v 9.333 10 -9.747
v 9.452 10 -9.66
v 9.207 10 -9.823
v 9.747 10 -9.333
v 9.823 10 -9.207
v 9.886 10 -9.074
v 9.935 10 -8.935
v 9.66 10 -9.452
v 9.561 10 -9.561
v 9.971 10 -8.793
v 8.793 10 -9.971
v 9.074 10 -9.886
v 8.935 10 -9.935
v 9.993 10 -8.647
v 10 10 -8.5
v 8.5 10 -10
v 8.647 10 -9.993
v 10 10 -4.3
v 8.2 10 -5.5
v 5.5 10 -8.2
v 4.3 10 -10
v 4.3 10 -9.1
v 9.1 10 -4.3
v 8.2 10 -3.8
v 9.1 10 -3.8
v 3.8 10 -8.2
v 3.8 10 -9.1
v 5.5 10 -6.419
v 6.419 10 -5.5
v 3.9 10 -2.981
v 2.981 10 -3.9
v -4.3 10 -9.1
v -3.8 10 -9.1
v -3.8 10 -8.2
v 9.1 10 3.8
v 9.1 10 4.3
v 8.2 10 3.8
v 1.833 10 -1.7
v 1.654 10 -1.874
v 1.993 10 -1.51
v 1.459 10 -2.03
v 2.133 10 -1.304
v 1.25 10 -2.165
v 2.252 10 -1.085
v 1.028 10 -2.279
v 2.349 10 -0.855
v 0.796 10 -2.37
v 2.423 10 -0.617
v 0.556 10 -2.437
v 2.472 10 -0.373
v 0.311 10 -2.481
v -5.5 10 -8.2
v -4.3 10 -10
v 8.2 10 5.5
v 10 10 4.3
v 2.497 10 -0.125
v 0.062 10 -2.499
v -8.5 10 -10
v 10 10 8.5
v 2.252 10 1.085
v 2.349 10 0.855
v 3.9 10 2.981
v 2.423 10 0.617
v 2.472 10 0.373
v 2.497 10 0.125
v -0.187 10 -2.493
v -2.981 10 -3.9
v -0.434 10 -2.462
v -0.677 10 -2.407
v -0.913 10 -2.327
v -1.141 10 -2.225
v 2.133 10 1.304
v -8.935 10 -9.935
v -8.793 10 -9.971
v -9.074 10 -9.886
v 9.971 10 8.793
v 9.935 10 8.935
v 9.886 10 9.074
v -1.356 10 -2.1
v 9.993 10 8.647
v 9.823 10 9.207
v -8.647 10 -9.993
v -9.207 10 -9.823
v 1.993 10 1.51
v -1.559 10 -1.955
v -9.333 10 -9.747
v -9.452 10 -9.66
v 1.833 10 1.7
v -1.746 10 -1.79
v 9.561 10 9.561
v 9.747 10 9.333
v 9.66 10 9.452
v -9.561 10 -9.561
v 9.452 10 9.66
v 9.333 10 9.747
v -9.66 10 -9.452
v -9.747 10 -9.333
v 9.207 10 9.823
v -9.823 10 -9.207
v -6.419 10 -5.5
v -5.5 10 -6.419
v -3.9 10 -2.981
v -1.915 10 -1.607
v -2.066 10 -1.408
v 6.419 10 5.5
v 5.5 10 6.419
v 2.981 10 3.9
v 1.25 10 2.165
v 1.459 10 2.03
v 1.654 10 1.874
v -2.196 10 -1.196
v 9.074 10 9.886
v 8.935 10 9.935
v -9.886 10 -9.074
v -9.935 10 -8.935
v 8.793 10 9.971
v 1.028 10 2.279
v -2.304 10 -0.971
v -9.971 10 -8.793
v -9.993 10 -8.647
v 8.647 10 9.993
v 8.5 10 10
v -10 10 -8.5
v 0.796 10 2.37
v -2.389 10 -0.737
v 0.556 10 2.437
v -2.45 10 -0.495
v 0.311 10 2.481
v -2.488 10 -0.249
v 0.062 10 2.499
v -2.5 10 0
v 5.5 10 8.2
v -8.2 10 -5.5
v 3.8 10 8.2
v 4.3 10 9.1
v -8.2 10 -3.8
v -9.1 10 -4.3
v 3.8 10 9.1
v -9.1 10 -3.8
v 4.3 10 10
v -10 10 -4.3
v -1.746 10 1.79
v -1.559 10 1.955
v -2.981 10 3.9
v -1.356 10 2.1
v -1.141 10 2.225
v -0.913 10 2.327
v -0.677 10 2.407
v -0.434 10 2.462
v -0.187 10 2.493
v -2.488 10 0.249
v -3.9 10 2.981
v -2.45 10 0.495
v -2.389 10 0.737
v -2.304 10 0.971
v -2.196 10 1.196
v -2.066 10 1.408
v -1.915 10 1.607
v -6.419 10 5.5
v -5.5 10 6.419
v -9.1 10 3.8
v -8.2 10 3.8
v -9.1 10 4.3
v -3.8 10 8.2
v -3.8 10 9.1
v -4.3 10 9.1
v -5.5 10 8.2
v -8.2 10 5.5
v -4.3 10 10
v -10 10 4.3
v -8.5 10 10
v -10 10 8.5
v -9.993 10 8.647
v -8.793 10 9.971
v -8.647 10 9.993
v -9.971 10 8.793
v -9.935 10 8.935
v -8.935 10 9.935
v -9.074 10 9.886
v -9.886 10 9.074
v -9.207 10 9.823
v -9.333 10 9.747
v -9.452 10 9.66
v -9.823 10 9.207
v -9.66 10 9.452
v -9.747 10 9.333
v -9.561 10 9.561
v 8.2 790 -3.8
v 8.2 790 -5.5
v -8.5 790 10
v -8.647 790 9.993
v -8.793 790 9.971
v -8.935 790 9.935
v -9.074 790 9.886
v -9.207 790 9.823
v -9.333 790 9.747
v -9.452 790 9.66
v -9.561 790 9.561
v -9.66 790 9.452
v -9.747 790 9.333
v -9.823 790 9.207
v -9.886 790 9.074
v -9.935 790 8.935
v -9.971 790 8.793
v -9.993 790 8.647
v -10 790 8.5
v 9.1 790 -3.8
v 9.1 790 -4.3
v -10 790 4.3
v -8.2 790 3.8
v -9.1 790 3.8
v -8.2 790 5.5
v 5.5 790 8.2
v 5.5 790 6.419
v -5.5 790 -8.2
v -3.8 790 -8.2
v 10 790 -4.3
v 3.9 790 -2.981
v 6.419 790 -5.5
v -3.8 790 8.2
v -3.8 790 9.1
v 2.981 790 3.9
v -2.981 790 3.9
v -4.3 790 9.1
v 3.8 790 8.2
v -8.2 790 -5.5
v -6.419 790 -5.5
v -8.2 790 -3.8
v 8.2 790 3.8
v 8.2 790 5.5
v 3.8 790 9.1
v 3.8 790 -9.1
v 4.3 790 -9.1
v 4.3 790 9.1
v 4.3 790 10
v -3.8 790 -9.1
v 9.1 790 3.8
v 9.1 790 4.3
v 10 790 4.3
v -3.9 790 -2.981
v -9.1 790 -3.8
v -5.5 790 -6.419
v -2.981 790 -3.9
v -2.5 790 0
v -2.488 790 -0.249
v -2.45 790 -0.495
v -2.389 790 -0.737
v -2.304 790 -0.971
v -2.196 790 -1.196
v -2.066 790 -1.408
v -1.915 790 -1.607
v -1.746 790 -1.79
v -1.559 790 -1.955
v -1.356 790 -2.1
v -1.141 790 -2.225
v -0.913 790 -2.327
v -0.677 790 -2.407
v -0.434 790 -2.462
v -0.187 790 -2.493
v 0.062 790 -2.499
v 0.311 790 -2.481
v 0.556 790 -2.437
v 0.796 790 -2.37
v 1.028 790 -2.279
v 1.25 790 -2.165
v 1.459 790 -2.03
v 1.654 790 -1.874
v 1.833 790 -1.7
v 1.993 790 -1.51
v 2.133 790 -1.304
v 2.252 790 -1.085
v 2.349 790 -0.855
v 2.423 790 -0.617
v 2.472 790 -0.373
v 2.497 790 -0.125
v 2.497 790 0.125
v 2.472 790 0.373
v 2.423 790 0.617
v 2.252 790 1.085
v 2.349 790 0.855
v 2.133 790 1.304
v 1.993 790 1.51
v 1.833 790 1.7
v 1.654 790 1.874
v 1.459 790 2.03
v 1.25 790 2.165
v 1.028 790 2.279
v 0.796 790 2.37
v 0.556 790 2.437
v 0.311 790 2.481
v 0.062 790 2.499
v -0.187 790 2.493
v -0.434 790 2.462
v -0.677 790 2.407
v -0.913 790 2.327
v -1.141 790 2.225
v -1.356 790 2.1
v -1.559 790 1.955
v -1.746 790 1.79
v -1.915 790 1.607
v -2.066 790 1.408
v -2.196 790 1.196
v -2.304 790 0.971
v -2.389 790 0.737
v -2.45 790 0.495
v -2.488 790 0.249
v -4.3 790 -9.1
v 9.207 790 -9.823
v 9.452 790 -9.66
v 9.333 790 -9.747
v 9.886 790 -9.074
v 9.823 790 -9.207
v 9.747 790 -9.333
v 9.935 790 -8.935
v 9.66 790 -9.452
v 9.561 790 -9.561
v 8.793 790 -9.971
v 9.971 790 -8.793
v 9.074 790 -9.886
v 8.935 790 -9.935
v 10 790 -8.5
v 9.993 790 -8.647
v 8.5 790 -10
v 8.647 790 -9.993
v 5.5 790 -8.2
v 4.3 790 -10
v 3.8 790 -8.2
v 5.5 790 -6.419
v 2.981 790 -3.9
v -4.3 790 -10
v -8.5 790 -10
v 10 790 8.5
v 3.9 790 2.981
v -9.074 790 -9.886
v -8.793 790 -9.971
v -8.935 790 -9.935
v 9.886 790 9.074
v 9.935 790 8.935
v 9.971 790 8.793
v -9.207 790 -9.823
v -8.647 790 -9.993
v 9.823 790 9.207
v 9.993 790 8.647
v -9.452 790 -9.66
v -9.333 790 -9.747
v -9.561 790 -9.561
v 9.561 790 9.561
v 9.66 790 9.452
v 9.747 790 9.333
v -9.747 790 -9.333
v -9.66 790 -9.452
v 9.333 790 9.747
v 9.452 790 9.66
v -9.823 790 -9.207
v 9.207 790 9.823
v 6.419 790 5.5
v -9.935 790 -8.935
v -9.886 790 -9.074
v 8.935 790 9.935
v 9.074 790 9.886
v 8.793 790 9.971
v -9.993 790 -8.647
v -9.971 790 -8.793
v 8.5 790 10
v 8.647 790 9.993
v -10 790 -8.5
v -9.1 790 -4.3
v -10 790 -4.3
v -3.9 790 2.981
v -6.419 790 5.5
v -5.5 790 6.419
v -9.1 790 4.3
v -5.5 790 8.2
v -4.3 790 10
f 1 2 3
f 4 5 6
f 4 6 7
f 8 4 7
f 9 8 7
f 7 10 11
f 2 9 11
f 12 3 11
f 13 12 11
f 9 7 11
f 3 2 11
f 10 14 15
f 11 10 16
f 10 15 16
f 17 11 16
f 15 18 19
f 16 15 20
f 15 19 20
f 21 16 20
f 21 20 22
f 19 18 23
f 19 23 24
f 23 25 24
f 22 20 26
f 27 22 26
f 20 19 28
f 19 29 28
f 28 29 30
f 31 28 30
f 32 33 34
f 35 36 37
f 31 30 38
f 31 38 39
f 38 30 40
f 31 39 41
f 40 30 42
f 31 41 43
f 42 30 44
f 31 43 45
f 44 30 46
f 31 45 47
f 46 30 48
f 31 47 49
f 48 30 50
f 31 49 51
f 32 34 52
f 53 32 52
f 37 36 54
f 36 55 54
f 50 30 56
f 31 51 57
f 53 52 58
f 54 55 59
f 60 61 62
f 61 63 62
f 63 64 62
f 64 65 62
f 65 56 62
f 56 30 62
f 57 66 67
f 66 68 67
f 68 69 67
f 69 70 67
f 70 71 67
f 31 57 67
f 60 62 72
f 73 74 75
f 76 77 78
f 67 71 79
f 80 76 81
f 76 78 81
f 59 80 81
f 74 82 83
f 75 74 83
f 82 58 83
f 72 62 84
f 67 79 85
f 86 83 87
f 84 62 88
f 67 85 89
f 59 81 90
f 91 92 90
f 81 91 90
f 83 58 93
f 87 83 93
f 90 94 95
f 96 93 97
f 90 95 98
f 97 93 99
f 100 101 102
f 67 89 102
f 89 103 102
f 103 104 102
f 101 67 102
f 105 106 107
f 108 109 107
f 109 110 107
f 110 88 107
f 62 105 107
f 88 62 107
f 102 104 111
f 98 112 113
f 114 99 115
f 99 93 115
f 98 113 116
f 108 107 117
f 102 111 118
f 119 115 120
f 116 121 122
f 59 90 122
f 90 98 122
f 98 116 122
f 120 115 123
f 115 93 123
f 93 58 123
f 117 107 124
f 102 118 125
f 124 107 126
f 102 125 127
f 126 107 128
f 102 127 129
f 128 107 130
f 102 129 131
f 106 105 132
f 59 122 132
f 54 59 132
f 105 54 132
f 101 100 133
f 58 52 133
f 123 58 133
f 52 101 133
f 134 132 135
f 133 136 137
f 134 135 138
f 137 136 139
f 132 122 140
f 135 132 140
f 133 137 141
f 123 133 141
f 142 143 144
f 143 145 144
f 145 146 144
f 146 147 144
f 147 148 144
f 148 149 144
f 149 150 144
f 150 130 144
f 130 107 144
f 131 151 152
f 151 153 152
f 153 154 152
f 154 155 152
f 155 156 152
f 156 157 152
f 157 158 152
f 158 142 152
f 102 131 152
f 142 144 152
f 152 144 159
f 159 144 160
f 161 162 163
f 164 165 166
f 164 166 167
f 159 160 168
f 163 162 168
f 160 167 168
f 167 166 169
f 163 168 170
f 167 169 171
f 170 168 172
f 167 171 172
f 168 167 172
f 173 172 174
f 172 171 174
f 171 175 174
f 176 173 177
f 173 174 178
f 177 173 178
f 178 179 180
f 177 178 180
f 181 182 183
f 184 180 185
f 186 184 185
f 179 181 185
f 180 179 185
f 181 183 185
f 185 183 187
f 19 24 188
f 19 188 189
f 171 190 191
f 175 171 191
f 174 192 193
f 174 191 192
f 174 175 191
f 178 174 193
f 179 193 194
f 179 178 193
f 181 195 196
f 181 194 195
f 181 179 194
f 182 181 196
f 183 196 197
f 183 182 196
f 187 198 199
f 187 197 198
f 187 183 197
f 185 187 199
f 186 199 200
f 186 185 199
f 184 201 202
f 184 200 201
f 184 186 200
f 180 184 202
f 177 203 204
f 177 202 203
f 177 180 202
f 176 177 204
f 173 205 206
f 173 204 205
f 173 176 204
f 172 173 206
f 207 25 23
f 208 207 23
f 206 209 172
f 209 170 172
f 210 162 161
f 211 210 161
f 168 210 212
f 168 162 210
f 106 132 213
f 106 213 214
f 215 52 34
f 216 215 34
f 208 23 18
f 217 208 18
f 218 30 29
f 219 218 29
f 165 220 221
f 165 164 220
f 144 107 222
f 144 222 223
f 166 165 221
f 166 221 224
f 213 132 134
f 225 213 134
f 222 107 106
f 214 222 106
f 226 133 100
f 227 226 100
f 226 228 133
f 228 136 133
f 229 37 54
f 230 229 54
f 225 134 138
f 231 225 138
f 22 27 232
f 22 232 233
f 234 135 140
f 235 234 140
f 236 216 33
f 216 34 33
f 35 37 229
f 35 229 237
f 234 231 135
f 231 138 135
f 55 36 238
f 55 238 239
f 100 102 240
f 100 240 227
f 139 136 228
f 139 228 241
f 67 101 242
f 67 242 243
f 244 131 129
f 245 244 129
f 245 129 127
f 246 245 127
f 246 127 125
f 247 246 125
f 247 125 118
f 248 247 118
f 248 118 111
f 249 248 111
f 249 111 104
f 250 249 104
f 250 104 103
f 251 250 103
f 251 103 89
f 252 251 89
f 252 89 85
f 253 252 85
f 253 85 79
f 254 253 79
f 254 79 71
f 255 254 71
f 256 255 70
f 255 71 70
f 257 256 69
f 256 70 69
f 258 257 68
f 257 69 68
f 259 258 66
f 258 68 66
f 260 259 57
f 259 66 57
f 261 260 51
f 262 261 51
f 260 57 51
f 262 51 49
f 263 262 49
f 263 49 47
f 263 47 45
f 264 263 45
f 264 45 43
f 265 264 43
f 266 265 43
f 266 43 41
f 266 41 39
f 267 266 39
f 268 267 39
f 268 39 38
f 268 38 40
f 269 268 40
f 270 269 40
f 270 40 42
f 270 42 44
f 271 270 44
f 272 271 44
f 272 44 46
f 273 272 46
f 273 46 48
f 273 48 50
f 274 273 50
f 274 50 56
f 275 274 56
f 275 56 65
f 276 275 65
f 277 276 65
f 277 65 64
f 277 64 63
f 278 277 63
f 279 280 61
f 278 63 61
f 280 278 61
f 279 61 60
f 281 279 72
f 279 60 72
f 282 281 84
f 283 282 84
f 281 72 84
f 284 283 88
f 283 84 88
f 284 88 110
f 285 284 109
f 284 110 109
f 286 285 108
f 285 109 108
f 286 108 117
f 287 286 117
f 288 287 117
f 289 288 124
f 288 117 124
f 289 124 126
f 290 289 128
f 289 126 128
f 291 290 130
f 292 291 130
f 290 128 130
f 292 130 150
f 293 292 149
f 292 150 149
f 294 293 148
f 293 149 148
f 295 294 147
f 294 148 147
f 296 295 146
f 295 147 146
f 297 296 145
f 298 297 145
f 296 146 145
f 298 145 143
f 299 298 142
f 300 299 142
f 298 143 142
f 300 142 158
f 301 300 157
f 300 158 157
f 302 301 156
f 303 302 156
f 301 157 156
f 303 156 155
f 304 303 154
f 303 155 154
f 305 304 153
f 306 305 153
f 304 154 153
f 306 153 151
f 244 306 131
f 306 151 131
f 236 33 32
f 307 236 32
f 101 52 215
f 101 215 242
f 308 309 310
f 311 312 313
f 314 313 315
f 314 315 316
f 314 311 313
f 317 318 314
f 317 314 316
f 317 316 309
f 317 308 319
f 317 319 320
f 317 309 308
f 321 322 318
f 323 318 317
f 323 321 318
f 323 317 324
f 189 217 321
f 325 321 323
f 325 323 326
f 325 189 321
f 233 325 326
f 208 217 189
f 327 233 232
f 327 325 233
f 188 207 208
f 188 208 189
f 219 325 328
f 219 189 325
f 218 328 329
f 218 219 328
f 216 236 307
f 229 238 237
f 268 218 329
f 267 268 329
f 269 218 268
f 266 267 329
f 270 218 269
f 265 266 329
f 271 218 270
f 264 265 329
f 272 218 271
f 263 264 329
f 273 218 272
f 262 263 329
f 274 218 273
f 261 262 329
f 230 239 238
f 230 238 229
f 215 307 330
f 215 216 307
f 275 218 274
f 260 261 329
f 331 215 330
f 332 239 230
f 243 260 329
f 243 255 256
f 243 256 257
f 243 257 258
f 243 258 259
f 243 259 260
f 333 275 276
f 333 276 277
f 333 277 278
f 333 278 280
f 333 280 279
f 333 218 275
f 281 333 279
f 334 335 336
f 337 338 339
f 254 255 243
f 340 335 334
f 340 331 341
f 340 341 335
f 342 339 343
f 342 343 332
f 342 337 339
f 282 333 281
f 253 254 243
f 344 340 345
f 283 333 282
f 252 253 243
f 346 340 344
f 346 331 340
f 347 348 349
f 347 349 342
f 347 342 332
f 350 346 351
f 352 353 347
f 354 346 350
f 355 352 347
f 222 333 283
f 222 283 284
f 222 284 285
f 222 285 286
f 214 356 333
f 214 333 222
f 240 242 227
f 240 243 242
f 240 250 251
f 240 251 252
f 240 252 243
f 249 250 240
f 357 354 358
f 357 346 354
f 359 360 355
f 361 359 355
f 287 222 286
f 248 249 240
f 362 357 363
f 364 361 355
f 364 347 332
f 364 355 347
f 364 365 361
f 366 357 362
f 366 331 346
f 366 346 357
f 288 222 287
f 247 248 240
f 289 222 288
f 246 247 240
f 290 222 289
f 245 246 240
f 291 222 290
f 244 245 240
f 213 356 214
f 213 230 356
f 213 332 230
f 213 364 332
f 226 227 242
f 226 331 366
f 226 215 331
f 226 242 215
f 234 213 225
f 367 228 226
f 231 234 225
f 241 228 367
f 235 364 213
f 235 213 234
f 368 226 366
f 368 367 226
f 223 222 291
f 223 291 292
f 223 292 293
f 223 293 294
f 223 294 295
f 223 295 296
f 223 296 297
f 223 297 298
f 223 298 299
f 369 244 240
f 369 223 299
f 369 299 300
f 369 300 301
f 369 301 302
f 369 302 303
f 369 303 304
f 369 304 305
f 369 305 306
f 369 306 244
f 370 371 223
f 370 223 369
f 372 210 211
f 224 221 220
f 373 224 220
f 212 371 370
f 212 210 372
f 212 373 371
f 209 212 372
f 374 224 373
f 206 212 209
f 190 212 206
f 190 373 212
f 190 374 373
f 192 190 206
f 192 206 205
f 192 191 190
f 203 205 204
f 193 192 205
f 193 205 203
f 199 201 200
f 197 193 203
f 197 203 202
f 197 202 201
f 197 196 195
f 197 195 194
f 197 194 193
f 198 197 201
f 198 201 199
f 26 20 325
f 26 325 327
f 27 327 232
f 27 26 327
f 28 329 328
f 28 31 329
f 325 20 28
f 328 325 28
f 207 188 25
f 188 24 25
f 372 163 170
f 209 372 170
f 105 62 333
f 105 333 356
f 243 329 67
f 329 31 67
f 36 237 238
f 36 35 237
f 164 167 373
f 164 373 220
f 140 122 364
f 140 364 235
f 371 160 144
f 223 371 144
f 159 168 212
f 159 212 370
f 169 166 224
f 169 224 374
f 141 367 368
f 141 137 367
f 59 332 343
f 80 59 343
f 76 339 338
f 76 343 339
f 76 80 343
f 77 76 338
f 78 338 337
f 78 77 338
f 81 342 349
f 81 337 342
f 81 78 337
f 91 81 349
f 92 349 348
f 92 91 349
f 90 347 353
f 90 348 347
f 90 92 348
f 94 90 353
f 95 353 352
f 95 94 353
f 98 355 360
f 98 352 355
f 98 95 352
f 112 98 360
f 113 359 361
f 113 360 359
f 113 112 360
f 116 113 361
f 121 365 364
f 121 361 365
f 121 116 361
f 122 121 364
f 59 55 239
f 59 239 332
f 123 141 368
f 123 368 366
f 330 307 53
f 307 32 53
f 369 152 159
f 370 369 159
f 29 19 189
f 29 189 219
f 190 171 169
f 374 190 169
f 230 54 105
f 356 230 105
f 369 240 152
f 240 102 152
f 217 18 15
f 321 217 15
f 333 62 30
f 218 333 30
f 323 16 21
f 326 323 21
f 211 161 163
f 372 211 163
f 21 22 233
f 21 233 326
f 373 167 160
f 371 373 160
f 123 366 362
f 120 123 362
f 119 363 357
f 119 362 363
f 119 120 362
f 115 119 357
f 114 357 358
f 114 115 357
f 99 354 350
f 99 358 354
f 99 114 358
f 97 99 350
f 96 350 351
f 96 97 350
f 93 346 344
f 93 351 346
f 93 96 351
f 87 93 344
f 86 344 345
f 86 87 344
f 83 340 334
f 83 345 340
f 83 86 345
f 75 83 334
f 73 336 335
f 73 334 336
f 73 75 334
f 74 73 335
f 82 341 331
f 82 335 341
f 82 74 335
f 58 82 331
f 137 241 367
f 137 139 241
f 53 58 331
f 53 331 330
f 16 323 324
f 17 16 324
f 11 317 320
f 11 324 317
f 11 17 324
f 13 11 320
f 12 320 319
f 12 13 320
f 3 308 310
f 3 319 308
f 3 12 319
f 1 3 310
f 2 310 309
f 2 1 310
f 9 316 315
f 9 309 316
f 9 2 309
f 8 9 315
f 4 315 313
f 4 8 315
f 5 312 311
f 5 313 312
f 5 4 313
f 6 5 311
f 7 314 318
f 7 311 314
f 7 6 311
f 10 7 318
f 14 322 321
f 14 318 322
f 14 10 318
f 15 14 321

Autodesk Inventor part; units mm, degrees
ref_plane "起始平面" through (0, 10, 0) normal (0, 1, 0) x (-1, 0, 0)
ref_plane "终止平面" through (0, 790, 0) normal (0, 1, 0) x (-1, 0, 0)
sketch "草图" plane through (0, 0, 0) normal (0, 1, 0) x (-1, 0, 0)
  line L0 (-9.1, 10.0192) -> (-9.101, 10.0203)
  line L1 (-10, 10) -> (-9.5607, 9.5607) construction
  arc A0 (-8.5, 10) -> (-10, 8.5) centre (-8.5, 8.5) ccw
  circle A1 centre (0, 0) radius 2.5
  line L2 (-2.9808, 3.9) -> (0, 3.9)
  line L3 (-3.9, 0) -> (-3.9, 2.9808)
  line L4 (-2.5, 0) -> (-3.1, 0)
  line L5 (2.9808, 3.9) -> (0, 3.9)
  circle A2 centre (0, 0) radius 2.5
  circle A3 centre (0, 0) radius 2.5
  circle A4 centre (0, 0) radius 2.5
  line L6 (0, 16.3557) -> (0, -12.0006)
  line L7 (-4.3, 9.1) -> (-4.3, 10)
  line L8 (2.9808, -3.9) -> (0, -3.9)
  line L9 (-3.9, 0) -> (-3.9, -2.9808)
  line L10 (3.9, 0) -> (3.9, -2.9808)
  line L11 (-2.9808, -3.9) -> (-5.5, -6.4192)
  line L12 (-2.9808, -3.9) -> (0, -3.9)
  line L13 (3.8, -8.2) -> (3.8, -9.1)
  line L14 (5.5, -6.4192) -> (2.9808, -3.9)
  line L15 (3.8, -9.1) -> (4.3, -9.1)
  line L16 (5.5, -8.2) -> (3.8, -8.2)
  line L17 (5.5, -8.2) -> (5.5, -6.4192)
  line L18 (3.9, -2.9808) -> (6.4192, -5.5)
  line L19 (8.2, -3.8) -> (8.2, -5.5)
  line L20 (8.2, -5.5) -> (6.4192, -5.5)
  line L21 (8.2, -3.8) -> (9.1, -3.8)
  line L22 (9.1, -3.8) -> (9.1, -4.3)
  line L23 (9.1, -4.3) -> (10, -4.3)
  line L24 (10, -4.3) -> (10, -8.5)
  arc A5 (8.5, -10) -> (10, -8.5) centre (8.5, -8.5) ccw
  line L25 (8.5, -10) -> (4.3, -10)
  line L26 (4.3, -9.1) -> (4.3, -10)
  line L27 (5.5, 6.4192) -> (2.9808, 3.9)
  line L28 (3.9, 2.9808) -> (6.4192, 5.5)
  line L29 (10, 4.3) -> (10, 8.5)
  line L30 (3.9, 0) -> (3.9, 2.9808)
  line L31 (5.5, 8.2) -> (5.5, 6.4192)
  line L32 (5.5, 8.2) -> (3.8, 8.2)
  line L33 (4.3, 9.1) -> (4.3, 10)
  arc A6 (10, 8.5) -> (8.5, 10) centre (8.5, 8.5) ccw
  line L34 (8.5, 10) -> (4.3, 10)
  line L35 (8.2, 3.8) -> (9.1, 3.8)
  line L36 (9.1, 4.3) -> (10, 4.3)
  line L37 (9.1, 3.8) -> (9.1, 4.3)
  line L38 (8.2, 3.8) -> (8.2, 5.5)
  line L39 (8.2, 5.5) -> (6.4192, 5.5)
  line L40 (3.8, 8.2) -> (3.8, 9.1)
  line L41 (3.8, 9.1) -> (4.3, 9.1)
  line L42 (-10, 4.3) -> (-10, 8.5)
  line L43 (-8.5, 10) -> (-4.3, 10)
  line L44 (-9.1, 4.3) -> (-10, 4.3)
  line L45 (-9.1, 3.8) -> (-9.1, 4.3)
  line L46 (-8.2, 3.8) -> (-9.1, 3.8)
  line L47 (-8.2, 5.5) -> (-6.4192, 5.5)
  line L48 (-8.2, 3.8) -> (-8.2, 5.5)
  line L49 (-5.5, 8.2) -> (-5.5, 6.4192)
  line L50 (-3.8, 9.1) -> (-4.3, 9.1)
  line L51 (-3.8, 8.2) -> (-3.8, 9.1)
  line L52 (-5.5, 8.2) -> (-3.8, 8.2)
  line L53 (-3.9, 2.9808) -> (-6.4192, 5.5)
  line L54 (-2.9808, 3.9) -> (-5.5, 6.4192)
  line L55 (-5.5, -8.2) -> (-3.8, -8.2)
  line L56 (-5.5, -8.2) -> (-5.5, -6.4192)
  line L57 (-3.9, -2.9808) -> (-6.4192, -5.5)
  line L58 (-3.8, -8.2) -> (-3.8, -9.1)
  line L59 (-3.8, -9.1) -> (-4.3, -9.1)
  line L60 (-4.3, -9.1) -> (-4.3, -10)
  line L61 (-8.2, -5.5) -> (-6.4192, -5.5)
  line L62 (-8.2, -3.8) -> (-9.1, -3.8)
  line L63 (-9.1, -3.8) -> (-9.1, -4.3)
  line L64 (-8.5, -10) -> (-4.3, -10)
  line L65 (-9.1, -4.3) -> (-10, -4.3)
  line L66 (-10, -4.3) -> (-10, -8.5)
  arc A7 (-10, -8.5) -> (-8.5, -10) centre (-8.5, -8.5) ccw
  line L67 (-8.2, -3.8) -> (-8.2, -5.5)
  dimension "圆角" = 1.5
  dimension "宽度" = 20
extrude "实体" add sketch "草图" along normal up to surface (780 mm away) from surface at 10 contours L43 L7 L50 L51 L52 L49 L54 L2 L6 A1 L12 L11 L56 L55 L58 L59 L60 L64 A7 L66 L65 L63 L62 L67 L61 L57 L9 L3 L53 L47 L48 L46 L45 L44 L42 A0 | L5 L27 L31 L32 L40 L41 L33 L34 A6 L29 L36 L37 L35 L38 L39 L28 L30 L10 L18 L20 L19 L21 L22 L23 L24 A5 L25 L26 L15 L13 L16 L17 L14 L8 L6 A1
sketch "草图2" plane through (0, 0, 0) normal (0, 1, 0) x (-1, 0, 0)
  line L0 (0, 0) -> (10, 0)
ref_plane "工作平面3" through (0, 0, 0) normal (0, 0, -1) x (-1, 0, 0)
sketch "草图3" plane through (0, 0, 0) normal (0, 0, -1) x (-1, 0, 0)
  line L0 (-2, 10) -> (12, 10)
  line L1 (-2, 790) -> (12, 790)
  dimension "d11" = 780
ref_plane "工作平面4" through (-4.3, 790, 900) normal (0, 1, 0) x (1, 0, 0)
split "分割1" plane through (-4.3, 790, 900) removes the side toward (0, 1, 0)
ref_plane "工作平面5" through (-8.5, 10, 900) normal (0, -1, 0) x (1, 0, 0)
split "分割2" plane through (-8.5, 10, 900) removes the side toward (0, -1, 0)
equation "\"G_L\" = d11"
properties part number "欧标 2020铝合金钢材-01"
